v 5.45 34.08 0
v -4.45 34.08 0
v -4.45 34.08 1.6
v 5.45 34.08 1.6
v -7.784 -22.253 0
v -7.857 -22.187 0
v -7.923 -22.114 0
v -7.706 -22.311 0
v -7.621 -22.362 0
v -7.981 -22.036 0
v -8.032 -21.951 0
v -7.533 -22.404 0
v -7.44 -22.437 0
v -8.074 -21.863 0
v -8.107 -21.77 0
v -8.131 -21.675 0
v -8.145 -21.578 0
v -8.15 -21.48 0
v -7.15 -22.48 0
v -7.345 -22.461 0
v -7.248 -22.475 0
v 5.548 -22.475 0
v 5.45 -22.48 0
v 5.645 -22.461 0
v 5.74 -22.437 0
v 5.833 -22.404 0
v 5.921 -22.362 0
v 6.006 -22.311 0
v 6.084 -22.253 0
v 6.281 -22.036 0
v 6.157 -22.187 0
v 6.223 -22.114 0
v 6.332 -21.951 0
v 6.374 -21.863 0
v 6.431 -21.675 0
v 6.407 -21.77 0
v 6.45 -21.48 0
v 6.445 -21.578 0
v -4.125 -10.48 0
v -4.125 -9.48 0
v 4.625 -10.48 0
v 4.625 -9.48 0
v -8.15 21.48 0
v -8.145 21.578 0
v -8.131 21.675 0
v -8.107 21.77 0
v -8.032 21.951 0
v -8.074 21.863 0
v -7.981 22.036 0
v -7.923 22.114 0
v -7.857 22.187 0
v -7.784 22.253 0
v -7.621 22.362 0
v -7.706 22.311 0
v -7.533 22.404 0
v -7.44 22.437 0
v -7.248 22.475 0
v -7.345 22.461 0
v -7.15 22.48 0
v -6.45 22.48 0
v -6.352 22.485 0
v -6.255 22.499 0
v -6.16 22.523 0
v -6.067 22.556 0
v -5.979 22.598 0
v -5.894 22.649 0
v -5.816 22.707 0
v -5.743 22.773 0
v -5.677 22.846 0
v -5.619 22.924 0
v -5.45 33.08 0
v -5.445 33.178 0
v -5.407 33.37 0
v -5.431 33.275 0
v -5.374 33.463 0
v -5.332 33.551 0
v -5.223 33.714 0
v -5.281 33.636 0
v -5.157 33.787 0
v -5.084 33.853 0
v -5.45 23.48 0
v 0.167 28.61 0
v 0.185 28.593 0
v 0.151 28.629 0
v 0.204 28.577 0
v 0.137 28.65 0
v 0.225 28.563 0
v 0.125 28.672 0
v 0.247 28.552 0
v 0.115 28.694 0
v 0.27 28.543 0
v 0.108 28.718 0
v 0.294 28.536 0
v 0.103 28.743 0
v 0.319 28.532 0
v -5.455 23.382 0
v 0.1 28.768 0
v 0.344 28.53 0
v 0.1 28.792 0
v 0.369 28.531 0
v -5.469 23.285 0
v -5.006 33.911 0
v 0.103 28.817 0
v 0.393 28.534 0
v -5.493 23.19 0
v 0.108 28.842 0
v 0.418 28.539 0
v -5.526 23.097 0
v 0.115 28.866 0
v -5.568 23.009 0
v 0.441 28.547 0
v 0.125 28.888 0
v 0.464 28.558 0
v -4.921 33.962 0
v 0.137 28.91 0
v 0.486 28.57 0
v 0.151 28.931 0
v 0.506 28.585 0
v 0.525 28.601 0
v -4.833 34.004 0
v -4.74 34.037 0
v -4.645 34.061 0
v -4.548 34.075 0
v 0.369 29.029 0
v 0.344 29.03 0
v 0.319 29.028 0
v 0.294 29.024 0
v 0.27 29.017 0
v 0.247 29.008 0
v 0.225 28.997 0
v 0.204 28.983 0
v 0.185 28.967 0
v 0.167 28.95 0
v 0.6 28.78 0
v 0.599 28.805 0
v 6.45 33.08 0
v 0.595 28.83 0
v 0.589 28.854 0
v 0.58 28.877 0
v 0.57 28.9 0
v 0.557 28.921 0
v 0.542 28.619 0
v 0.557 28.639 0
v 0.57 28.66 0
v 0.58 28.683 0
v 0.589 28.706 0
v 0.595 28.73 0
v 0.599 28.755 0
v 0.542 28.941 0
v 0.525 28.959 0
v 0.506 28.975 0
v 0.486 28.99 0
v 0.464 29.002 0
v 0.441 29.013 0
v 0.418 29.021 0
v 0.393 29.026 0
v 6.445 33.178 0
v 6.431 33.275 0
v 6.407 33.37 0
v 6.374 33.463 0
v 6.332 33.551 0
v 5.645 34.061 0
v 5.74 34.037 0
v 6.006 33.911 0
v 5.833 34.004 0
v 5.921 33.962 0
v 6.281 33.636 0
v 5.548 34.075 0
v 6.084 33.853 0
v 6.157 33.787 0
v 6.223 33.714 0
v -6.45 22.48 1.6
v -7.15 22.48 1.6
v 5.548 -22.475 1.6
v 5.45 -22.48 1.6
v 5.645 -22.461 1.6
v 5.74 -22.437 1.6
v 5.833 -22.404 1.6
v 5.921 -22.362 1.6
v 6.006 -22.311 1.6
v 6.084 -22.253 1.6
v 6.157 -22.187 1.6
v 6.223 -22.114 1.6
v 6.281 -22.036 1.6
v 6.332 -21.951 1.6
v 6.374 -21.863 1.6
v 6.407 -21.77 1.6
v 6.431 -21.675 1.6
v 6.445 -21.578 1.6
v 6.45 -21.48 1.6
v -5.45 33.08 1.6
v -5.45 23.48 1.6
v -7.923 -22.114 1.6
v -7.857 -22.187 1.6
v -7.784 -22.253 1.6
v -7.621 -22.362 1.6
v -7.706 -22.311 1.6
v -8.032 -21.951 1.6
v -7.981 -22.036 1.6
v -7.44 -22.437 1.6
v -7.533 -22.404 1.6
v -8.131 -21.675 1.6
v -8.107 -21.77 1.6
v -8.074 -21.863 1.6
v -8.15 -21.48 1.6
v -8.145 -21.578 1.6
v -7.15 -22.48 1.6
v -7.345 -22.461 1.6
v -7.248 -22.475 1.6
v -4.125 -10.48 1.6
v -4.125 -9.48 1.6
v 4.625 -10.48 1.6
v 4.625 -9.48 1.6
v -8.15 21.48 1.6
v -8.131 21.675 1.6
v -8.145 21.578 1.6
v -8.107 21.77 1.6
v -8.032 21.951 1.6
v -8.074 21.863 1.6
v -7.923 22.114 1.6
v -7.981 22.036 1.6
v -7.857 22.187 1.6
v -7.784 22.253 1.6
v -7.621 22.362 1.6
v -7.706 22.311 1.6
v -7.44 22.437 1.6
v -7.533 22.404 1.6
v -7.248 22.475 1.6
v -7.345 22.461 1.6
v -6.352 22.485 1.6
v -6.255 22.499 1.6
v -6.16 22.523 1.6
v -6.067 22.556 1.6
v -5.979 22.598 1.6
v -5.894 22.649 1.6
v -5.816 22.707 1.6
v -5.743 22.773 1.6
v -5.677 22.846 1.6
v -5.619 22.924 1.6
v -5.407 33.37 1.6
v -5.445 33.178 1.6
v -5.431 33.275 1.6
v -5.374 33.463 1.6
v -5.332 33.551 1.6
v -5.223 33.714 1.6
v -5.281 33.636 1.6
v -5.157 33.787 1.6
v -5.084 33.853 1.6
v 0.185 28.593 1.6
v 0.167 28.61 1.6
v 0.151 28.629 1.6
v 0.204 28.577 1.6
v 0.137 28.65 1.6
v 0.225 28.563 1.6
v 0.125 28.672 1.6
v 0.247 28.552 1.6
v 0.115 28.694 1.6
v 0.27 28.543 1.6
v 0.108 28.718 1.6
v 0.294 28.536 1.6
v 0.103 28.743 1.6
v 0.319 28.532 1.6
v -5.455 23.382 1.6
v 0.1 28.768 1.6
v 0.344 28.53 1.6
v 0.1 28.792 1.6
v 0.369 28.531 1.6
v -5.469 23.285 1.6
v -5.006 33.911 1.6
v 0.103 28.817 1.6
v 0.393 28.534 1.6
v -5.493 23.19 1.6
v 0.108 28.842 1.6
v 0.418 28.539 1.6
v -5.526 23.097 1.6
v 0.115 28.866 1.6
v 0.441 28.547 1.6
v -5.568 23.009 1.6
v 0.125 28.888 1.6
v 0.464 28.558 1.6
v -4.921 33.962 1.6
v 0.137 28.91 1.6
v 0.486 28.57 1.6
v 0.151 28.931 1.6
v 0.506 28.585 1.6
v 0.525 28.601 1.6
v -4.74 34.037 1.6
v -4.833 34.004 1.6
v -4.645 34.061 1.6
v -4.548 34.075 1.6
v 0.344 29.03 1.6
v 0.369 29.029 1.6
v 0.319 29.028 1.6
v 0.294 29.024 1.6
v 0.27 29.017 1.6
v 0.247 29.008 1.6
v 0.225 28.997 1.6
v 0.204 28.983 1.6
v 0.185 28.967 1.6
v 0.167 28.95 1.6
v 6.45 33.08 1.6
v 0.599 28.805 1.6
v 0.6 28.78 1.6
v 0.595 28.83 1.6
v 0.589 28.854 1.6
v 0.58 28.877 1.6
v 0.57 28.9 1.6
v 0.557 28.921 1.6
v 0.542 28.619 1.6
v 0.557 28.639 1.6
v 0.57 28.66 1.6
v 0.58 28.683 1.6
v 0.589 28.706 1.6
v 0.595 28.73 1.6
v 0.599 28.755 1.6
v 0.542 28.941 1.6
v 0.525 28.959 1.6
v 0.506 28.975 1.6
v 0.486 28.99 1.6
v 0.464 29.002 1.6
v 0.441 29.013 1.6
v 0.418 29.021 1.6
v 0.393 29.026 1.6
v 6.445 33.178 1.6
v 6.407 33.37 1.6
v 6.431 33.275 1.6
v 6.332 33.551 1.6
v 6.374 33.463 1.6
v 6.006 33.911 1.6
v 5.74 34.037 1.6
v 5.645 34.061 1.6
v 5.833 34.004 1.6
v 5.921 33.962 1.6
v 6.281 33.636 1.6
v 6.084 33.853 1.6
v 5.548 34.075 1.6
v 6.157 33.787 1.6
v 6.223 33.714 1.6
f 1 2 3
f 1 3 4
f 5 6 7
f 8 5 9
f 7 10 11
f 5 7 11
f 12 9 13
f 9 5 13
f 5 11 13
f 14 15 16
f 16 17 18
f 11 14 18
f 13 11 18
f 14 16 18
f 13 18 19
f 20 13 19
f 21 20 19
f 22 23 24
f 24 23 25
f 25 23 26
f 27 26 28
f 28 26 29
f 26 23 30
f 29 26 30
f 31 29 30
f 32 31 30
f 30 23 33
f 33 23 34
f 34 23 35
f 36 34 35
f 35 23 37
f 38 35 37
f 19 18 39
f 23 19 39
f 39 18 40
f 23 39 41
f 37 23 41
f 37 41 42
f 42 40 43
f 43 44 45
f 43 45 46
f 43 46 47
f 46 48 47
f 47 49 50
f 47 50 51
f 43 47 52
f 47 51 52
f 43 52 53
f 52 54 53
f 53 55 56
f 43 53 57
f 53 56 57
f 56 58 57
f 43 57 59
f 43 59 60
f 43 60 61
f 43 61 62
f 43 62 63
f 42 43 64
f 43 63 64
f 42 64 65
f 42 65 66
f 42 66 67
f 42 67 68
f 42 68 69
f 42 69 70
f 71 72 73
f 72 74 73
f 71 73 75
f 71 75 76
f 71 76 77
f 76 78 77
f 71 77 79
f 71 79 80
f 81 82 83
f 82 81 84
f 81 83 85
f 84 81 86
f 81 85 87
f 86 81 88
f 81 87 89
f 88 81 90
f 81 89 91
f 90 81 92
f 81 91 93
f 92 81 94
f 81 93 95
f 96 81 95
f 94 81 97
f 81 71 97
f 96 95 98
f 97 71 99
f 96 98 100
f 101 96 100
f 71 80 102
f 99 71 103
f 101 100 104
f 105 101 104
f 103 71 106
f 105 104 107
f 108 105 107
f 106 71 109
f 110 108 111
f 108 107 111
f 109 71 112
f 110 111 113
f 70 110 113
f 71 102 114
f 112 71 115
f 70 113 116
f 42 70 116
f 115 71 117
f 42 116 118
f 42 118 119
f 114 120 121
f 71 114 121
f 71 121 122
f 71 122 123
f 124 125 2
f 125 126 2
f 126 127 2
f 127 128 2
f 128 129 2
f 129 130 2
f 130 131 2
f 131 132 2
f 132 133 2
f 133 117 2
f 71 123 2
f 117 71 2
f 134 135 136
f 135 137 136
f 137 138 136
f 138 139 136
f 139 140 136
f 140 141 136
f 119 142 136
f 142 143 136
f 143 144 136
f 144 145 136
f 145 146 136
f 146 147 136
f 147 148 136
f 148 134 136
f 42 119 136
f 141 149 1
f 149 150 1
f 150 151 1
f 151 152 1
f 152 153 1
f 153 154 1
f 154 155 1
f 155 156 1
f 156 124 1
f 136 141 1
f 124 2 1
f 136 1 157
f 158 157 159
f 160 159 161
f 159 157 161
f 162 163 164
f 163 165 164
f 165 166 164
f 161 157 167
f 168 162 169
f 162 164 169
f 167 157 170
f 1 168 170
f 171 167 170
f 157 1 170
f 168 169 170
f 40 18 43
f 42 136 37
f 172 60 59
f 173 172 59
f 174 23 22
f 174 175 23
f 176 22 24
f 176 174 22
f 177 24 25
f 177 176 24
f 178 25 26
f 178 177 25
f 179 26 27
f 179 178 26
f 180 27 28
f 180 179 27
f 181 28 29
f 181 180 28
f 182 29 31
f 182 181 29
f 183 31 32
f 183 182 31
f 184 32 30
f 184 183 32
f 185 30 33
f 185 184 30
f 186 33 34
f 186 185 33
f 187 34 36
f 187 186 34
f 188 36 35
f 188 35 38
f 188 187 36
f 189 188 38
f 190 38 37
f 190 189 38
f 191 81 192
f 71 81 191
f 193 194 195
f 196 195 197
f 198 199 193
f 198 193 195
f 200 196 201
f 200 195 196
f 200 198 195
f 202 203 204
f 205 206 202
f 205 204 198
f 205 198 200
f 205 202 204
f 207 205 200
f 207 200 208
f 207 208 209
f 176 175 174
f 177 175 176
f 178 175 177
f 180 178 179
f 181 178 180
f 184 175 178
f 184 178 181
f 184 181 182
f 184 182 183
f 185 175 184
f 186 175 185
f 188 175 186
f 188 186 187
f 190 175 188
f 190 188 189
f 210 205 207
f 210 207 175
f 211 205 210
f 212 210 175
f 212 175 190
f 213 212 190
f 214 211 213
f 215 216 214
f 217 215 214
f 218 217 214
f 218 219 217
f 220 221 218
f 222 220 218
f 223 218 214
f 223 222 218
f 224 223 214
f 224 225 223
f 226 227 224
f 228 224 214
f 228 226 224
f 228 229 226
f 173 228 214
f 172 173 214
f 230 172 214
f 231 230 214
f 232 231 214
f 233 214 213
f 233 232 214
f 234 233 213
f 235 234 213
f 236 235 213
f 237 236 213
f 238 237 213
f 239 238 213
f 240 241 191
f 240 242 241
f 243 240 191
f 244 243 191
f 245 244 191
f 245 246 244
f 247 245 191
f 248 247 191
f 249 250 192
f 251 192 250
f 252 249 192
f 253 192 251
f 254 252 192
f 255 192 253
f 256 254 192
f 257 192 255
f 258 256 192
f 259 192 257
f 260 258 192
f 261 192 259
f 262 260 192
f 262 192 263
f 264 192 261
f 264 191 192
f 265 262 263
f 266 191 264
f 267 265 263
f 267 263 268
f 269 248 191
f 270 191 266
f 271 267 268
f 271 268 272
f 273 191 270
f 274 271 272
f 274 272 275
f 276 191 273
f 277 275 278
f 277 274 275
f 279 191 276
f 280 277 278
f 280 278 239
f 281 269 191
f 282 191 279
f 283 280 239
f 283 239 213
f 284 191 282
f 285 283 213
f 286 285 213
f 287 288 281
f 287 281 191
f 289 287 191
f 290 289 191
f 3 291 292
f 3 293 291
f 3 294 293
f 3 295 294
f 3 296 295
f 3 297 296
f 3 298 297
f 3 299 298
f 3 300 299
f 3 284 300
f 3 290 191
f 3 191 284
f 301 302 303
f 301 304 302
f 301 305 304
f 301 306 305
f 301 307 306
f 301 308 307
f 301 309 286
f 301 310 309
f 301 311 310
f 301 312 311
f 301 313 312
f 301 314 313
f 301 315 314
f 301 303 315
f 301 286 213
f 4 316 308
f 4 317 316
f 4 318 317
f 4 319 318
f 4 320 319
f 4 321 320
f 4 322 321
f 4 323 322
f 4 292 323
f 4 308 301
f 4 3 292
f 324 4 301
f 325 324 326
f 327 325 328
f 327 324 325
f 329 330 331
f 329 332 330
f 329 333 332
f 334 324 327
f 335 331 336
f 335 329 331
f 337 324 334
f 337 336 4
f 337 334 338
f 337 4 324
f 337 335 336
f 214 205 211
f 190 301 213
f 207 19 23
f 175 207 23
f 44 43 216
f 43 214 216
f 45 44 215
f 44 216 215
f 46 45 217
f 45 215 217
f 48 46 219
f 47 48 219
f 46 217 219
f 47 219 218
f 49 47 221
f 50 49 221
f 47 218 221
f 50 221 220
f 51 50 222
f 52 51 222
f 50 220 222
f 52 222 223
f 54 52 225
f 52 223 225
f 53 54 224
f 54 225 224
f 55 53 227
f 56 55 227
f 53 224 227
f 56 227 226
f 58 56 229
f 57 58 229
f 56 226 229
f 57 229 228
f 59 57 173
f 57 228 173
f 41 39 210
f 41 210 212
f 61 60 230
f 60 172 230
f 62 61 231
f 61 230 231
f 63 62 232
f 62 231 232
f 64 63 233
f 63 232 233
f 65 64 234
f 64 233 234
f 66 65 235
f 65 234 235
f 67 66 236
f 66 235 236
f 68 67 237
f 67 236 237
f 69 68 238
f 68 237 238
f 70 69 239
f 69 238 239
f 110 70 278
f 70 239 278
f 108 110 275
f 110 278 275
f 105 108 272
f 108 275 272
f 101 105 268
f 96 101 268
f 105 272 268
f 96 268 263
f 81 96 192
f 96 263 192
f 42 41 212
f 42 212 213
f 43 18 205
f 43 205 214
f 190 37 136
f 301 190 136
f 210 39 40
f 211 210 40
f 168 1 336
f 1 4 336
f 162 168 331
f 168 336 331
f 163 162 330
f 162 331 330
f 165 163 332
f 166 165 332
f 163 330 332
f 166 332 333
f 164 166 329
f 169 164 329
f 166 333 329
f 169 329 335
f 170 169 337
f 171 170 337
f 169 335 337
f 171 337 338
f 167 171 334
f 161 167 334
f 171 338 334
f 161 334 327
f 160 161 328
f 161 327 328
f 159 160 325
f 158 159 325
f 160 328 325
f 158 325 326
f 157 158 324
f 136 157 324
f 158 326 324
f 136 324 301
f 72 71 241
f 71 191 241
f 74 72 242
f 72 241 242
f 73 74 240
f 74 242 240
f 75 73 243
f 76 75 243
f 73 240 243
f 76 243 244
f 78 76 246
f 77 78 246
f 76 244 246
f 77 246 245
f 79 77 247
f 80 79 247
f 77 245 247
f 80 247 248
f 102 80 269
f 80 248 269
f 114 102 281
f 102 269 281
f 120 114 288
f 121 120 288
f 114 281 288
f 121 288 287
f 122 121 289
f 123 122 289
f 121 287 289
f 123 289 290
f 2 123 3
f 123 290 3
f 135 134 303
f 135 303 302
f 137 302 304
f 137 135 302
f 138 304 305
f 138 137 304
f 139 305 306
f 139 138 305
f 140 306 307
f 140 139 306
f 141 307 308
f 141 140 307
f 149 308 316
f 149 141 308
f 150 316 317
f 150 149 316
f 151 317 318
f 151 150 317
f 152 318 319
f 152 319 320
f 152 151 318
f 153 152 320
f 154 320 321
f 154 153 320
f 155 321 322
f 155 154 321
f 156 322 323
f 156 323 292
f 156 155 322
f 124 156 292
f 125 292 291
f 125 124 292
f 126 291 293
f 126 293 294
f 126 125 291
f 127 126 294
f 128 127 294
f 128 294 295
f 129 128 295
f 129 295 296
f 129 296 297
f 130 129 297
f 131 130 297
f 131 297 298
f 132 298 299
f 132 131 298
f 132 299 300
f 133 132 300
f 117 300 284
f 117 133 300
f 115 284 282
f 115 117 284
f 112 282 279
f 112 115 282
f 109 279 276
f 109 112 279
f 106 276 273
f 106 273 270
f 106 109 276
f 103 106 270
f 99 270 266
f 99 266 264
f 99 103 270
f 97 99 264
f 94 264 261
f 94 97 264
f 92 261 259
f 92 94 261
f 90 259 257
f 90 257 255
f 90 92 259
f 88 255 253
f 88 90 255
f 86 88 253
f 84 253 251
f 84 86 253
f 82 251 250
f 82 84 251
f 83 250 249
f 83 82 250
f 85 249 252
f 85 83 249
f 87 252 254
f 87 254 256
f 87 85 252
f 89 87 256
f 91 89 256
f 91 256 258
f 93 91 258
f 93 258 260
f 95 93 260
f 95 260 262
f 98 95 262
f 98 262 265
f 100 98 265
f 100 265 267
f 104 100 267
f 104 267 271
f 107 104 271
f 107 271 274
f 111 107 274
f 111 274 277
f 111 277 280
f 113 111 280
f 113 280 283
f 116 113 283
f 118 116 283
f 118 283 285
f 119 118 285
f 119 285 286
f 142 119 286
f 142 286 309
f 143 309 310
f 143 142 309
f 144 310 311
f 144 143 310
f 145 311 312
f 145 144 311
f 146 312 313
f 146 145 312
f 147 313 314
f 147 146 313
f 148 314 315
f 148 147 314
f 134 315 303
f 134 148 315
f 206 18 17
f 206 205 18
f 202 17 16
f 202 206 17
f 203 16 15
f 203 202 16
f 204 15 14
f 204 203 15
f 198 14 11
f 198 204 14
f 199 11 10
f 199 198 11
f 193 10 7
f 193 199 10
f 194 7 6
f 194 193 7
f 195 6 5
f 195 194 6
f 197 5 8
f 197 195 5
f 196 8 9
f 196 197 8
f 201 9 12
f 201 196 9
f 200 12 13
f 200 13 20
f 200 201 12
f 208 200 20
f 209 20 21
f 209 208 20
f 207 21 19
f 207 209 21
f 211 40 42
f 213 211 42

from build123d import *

# Parameters (mm, degrees)
SKETCH_2_W          = 14.6
SKETCH_2_H          = 56.56
SKETCH_2_R          = 0.25
SKETCH_2_W_2        = 8.75
SKETCH_2_H_2        = 1
EXTRUDE_1_DEPTH     = 1.6
SKETCH_3_W          = 2.7
SKETCH_3_H          = 11.6
CUT_EXTRUDE_1_DEPTH = 1.6
FILLET_2_R          = 1


with BuildPart() as part:
    # 草图2 → 凸台-拉伸1 (new body)
    with BuildSketch(Plane.XY):
        with Locations((-0.85, 5.8)):
            Rectangle(SKETCH_2_W, SKETCH_2_H)
        with Locations((0.35, 28.78)):
            Circle(SKETCH_2_R, mode=Mode.SUBTRACT)
        with Locations((0.25, -9.98)):
            Rectangle(SKETCH_2_W_2, SKETCH_2_H_2, mode=Mode.SUBTRACT)
    extrude(amount=EXTRUDE_1_DEPTH)

    # 草图3 → 切除-拉伸1 (cut)
    with BuildSketch(Plane(origin=(0, 0, 0), x_dir=(-1, 0, 0), z_dir=(0, 0, -1))):
        with Locations((6.8, 28.28)):
            Rectangle(SKETCH_3_W, SKETCH_3_H)
    extrude(amount=-CUT_EXTRUDE_1_DEPTH, mode=Mode.SUBTRACT)

    # 圆角2
    fillet_2_edges = [part.edges().sort_by_distance(p)[0] for p in [
        (-5.45, 22.48, 0.8),
        (-5.45, 34.08, 0.8),
        (-8.15, 22.48, 0.8),
        (6.45, -22.48, 0.8),
        (-8.15, -22.48, 0.8),
        (6.45, 34.08, 0.8),
    ]]
    fillet(fillet_2_edges, radius=FILLET_2_R)


solid = part.part
